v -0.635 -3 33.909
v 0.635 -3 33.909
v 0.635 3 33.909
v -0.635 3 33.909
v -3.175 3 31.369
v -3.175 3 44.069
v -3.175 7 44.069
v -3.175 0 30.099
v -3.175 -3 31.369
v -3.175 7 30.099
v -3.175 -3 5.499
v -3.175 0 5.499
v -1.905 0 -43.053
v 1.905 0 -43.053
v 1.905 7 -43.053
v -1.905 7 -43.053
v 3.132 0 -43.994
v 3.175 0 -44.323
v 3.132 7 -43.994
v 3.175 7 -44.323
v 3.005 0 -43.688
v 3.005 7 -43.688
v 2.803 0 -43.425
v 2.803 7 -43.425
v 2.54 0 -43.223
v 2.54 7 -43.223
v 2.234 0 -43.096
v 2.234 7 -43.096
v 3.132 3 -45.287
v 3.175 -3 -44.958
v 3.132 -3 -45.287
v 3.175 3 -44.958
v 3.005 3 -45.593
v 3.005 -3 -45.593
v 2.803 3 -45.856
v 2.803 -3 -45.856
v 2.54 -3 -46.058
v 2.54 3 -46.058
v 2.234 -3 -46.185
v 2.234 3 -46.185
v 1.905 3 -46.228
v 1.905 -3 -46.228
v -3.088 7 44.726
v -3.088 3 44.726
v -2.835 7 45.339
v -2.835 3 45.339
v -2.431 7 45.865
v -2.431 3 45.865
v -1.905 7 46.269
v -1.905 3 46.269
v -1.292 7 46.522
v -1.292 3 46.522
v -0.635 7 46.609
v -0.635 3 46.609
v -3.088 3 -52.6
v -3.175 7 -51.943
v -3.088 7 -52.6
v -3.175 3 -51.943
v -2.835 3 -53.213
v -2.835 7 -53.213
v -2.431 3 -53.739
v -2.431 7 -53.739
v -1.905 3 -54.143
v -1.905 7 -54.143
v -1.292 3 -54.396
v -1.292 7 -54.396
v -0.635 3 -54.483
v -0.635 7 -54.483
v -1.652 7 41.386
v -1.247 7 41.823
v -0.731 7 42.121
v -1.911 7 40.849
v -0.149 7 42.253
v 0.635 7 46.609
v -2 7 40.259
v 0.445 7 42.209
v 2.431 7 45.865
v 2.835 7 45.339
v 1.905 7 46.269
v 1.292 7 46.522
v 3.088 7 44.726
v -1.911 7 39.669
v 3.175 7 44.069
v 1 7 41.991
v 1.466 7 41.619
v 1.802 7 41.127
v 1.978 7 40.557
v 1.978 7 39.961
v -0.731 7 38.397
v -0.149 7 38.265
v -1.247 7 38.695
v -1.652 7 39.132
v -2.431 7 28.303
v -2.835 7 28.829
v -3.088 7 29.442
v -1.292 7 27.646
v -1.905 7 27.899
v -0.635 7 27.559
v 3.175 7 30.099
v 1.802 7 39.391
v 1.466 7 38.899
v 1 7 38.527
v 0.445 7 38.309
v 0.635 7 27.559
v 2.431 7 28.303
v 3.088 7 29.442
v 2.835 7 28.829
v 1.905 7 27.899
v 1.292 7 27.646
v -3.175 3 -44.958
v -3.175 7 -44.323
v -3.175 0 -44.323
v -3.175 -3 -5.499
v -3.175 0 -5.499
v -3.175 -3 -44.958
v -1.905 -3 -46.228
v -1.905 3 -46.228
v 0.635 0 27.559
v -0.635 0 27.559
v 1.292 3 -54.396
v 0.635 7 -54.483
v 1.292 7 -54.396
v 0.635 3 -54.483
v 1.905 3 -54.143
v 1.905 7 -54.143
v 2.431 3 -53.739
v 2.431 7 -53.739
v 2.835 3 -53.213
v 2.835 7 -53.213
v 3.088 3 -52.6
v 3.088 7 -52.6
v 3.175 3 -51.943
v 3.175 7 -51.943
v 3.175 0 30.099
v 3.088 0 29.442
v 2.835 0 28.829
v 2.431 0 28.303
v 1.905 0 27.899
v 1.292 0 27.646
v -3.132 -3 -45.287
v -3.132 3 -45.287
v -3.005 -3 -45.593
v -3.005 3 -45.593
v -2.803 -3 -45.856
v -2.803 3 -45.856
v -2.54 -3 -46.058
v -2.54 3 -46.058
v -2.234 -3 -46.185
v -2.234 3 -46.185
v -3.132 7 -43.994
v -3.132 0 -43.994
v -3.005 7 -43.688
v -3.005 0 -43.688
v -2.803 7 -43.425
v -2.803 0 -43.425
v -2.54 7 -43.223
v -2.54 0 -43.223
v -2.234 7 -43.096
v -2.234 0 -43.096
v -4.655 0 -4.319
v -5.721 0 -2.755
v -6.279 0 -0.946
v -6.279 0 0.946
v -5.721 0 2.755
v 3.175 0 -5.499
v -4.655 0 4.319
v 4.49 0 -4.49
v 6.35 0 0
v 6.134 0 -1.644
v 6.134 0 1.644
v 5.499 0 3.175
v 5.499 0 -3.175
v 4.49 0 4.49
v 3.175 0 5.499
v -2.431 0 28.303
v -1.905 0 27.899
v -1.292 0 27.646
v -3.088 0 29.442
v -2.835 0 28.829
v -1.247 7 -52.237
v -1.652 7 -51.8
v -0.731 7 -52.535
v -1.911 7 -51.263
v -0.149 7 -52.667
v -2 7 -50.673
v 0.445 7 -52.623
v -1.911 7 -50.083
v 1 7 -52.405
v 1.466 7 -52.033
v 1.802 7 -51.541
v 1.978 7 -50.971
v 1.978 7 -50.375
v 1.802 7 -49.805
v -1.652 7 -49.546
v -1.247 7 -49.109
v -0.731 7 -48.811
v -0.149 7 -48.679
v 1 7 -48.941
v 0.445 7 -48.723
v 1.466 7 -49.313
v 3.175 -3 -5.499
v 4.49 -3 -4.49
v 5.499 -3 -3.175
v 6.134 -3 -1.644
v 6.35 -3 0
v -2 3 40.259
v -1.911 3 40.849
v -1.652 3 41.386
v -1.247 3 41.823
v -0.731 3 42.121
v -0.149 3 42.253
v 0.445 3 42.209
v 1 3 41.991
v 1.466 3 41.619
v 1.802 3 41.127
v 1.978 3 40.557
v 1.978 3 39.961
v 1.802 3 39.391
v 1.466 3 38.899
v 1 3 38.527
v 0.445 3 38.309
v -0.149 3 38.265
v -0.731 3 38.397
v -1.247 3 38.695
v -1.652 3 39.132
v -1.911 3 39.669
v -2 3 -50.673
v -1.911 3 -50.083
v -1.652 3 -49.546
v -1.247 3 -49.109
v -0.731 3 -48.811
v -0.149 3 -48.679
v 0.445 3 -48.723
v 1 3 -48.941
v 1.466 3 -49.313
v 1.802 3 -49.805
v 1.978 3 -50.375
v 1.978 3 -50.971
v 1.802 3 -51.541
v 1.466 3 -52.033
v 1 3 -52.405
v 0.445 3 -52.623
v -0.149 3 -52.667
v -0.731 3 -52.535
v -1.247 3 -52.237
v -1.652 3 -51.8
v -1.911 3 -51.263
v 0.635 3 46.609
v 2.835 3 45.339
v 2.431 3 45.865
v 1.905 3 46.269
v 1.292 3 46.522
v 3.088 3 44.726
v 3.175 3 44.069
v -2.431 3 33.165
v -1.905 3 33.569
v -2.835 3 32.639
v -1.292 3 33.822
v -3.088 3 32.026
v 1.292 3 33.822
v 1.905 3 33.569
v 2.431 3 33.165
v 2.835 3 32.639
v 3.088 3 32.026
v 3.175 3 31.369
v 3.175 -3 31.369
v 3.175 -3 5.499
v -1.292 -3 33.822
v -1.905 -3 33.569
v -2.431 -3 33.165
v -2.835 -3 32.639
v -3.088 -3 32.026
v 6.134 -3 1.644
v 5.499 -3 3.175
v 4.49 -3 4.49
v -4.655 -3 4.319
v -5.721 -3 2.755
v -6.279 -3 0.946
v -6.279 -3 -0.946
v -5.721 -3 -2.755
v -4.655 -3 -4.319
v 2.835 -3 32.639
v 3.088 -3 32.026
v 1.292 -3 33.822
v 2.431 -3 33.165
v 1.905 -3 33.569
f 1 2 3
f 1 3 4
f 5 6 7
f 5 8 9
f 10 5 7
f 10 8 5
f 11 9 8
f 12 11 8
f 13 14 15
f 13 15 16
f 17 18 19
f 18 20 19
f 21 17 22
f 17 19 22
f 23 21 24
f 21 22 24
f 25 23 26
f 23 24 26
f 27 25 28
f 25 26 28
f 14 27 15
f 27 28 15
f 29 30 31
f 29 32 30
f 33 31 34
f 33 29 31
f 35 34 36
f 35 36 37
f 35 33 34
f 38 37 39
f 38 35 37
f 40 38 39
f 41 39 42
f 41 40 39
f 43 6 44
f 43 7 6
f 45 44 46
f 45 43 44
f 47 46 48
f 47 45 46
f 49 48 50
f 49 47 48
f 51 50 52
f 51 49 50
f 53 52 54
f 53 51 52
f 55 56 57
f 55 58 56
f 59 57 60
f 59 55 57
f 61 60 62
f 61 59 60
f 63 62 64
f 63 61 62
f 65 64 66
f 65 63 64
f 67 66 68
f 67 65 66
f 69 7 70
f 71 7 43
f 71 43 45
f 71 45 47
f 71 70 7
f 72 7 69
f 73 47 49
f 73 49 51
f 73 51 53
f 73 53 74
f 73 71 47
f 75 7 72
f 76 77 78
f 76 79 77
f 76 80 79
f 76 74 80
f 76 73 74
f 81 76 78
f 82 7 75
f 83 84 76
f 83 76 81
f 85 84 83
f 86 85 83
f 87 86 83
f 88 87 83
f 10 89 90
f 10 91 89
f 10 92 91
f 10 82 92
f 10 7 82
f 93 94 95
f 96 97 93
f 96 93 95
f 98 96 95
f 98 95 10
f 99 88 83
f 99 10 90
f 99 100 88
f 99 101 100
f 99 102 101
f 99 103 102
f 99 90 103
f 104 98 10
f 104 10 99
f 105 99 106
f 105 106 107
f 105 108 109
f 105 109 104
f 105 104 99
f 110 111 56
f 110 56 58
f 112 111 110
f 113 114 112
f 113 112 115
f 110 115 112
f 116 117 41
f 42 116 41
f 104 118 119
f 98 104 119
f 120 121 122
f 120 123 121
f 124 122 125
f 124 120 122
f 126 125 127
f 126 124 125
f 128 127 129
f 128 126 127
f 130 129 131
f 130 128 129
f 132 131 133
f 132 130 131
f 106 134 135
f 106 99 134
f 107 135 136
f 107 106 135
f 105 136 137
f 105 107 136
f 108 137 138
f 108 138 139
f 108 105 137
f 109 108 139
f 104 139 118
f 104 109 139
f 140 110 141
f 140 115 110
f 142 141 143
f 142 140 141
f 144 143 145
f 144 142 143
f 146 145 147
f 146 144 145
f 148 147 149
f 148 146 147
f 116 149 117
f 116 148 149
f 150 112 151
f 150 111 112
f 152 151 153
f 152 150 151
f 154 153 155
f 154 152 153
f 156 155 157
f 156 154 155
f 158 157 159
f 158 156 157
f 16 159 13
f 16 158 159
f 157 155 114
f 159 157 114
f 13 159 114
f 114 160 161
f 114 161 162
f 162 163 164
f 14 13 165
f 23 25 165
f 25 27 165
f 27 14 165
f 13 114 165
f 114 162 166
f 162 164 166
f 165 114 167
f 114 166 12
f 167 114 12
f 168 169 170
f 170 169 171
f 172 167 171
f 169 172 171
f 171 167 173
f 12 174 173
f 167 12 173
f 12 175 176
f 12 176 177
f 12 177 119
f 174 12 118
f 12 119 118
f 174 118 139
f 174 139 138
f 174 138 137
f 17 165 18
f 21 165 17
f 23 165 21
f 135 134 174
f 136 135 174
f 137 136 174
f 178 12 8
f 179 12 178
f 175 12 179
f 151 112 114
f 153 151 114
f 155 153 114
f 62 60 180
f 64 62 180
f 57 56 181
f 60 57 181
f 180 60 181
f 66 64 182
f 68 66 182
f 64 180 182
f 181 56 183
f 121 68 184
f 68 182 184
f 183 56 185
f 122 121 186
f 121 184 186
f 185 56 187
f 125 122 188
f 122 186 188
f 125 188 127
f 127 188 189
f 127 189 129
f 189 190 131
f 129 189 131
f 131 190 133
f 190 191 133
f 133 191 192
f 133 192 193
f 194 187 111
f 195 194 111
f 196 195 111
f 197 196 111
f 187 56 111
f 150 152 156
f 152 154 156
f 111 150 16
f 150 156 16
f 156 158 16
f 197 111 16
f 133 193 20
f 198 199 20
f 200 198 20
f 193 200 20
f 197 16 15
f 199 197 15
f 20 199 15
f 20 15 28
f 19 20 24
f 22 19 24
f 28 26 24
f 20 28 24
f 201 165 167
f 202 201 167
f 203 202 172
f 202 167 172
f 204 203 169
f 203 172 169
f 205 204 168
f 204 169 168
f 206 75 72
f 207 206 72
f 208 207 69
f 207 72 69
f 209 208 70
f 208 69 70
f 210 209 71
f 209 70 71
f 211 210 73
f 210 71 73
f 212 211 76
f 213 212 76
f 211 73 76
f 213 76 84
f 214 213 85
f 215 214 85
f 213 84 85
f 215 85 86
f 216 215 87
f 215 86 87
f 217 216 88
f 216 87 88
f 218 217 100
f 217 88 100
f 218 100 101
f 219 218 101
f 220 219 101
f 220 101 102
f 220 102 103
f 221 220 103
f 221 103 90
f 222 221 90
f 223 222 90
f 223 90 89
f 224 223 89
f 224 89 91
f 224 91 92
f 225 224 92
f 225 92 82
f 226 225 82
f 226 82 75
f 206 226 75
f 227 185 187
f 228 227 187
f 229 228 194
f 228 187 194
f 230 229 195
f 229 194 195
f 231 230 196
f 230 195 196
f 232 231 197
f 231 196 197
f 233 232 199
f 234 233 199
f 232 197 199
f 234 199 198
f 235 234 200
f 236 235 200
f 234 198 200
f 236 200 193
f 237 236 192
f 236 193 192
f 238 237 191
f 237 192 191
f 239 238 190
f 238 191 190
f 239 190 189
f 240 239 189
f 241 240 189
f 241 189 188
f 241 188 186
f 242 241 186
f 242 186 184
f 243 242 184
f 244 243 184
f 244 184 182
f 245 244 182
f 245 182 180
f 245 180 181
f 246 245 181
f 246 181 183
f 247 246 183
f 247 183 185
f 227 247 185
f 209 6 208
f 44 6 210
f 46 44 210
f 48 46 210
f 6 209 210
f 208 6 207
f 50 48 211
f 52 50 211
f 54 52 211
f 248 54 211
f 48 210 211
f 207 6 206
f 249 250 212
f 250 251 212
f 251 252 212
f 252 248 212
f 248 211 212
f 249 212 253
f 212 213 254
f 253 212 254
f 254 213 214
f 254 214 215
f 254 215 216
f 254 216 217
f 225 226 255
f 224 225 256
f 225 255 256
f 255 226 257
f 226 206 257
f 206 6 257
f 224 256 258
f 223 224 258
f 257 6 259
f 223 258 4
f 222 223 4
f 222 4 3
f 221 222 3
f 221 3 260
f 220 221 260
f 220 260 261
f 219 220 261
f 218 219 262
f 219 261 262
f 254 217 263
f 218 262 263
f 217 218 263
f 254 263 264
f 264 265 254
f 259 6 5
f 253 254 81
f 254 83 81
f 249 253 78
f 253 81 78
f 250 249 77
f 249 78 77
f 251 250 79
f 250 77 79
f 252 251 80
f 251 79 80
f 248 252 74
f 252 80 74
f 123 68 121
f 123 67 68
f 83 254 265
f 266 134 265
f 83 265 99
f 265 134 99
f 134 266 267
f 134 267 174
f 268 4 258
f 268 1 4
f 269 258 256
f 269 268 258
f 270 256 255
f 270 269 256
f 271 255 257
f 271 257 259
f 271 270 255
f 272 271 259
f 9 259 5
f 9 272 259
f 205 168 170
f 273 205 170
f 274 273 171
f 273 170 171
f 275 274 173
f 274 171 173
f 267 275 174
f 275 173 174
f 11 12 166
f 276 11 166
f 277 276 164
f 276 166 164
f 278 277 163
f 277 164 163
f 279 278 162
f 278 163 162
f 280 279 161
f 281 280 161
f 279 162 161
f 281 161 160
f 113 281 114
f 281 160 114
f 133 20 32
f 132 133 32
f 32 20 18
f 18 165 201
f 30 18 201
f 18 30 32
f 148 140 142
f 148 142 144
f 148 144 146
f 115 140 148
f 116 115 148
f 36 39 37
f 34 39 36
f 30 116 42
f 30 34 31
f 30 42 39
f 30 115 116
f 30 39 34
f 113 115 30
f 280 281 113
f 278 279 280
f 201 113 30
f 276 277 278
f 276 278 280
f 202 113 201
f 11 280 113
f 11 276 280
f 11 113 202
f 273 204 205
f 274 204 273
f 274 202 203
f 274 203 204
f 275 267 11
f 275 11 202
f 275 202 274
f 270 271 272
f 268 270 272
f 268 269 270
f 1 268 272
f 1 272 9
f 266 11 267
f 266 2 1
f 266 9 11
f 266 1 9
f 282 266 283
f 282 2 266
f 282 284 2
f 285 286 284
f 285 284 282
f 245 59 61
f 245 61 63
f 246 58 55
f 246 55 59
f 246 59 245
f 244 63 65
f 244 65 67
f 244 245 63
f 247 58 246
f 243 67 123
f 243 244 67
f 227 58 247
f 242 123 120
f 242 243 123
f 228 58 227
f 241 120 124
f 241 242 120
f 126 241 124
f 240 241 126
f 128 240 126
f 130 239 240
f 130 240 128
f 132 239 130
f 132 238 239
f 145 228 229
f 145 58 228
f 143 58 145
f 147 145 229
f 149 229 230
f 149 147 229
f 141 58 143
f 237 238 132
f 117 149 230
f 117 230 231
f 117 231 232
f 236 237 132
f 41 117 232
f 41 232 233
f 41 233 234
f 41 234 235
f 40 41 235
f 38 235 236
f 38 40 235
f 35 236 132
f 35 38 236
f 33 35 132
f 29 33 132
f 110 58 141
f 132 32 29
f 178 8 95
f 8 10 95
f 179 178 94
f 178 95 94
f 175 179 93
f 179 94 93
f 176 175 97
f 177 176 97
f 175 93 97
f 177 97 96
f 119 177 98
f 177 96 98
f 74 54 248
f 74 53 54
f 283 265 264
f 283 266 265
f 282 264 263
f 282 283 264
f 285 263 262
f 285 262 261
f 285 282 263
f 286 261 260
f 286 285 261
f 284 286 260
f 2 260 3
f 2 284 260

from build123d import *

# Parameters (mm, degrees)
F1_DEPTH  = 3
F2_W      = 6.35
F2_H      = 6.35
F2_H_2    = 3.175
F3_DEPTH  = 7
F4_W      = 6.35
F4_H      = 4
F5_DEPTH  = 12.7
F6_R      = 2
F7_DEPTH  = 25.4
F8_W      = 6.35
F8_H      = 4
F9_DEPTH  = 8.255
F10_R     = 2
F11_DEPTH = 25.4
F12_R     = 2.54
F13_R     = 1.27


with BuildPart() as f1:
    # F0 (on Front) → F1 (new body)
    with BuildSketch(Plane.XZ):
        with BuildLine():
            ThreePointArc((-3.175, 5.499261314), (0, 6.35), (3.175, 5.499261314))
            Line((3.175, 5.499261314), (3.175, 33.909))
            Line((3.175, 33.909), (-3.175, 33.909))
            Line((-3.175, 33.909), (-3.175, 5.499261314))
        make_face()
        with BuildLine():
            Line((-3.175, 0), (-3.175, 5.499261314))
            ThreePointArc((-3.175, 5.499261314), (-6.35, 0), (-3.175, -5.499261314))
            Line((-3.175, -5.499261314), (-3.175, 0))
        make_face()
        with BuildLine():
            ThreePointArc((-3.175, -5.499261314), (0, -6.35), (3.175, -5.499261314))
            Line((3.175, -5.499261314), (3.175, 0))
            Line((3.175, 0), (-3.175, 0))
            Line((-3.175, 0), (-3.175, -5.499261314))
        make_face()
        with BuildLine():
            ThreePointArc((3.175, -5.499261314), (5.499261314, -3.175), (6.35, 0))
            ThreePointArc((6.35, 0), (5.499261314, 3.175), (3.175, 5.499261314))
            Line((3.175, 5.499261314), (3.175, 0))
            Line((3.175, 0), (3.175, -5.499261314))
        make_face()
        with BuildLine():
            Line((3.175, 0), (3.175, 5.499261314))
            ThreePointArc((3.175, 5.499261314), (0, 6.35), (-3.175, 5.499261314))
            Line((-3.175, 5.499261314), (-3.175, 0))
            Line((-3.175, 0), (3.175, 0))
        make_face()
        with BuildLine():
            Line((3.175, -46.228), (3.175, -5.499261314))
            ThreePointArc((3.175, -5.499261314), (0, -6.35), (-3.175, -5.499261314))
            Line((-3.175, -5.499261314), (-3.175, -46.228))
            Line((-3.175, -46.228), (3.175, -46.228))
        make_face()
    extrude(amount=F1_DEPTH)

    # F2 (on face) → F3 (join)
    with BuildSketch(Plane(origin=(0, 0, 0), x_dir=(-1, 0, 0), z_dir=(0, 1, 0))):
        with Locations((0, 30.734)):
            Rectangle(F2_W, F2_H)
        with Locations((0, -44.6405)):
            Rectangle(F2_W, F2_H_2)
    extrude(amount=F3_DEPTH)

    # F4 (on face) → F5 (join)
    with BuildSketch(Plane.XY.offset(33.909)):
        with Locations((0, 5)):
            Rectangle(F4_W, F4_H)
    extrude(amount=F5_DEPTH)

    # F6 (on face) → F7 (cut)
    with BuildSketch(Plane(origin=(0, 7, 0), x_dir=(-1, 0, 0), z_dir=(0, 1, 0))):
        with Locations((0, 40.259)):
            Circle(F6_R)
    extrude(amount=-F7_DEPTH, mode=Mode.SUBTRACT)

    # F8 (on face) → F9 (join)
    with BuildSketch(Plane(origin=(0, 0, -46.228), x_dir=(1, 0, 0), z_dir=(0, 0, -1))):
        with Locations((0, -5)):
            Rectangle(F8_W, F8_H)
    extrude(amount=F9_DEPTH)

    # F10 (on face) → F11 (cut)
    with BuildSketch(Plane(origin=(0, 7, 0), x_dir=(-1, 0, 0), z_dir=(0, 1, 0))):
        with Locations((0, -50.673)):
            Circle(F10_R)
    extrude(amount=-F11_DEPTH, mode=Mode.SUBTRACT)

    # F12
    f12_edges = [f1.edges().sort_by_distance(p)[0] for p in [
        (-3.175, 5, 46.609),
        (3.175, 5, 46.609),
        (-3.175, 3.5, 27.559),
        (3.175, 0, 33.909),
        (-3.175, 0, 33.909),
        (3.175, 3.5, 27.559),
        (-3.175, 5, -54.483),
        (3.175, 5, -54.483),
    ]]
    fillet(f12_edges, radius=F12_R)

    # F13
    f13_edges = [f1.edges().sort_by_distance(p)[0] for p in [
        (3.175, 3.5, -43.053),
        (-3.175, 3.5, -43.053),
        (3.175, 0, -46.228),
        (-3.175, 0, -46.228),
    ]]
    fillet(f13_edges, radius=F13_R)


solid = f1.part
